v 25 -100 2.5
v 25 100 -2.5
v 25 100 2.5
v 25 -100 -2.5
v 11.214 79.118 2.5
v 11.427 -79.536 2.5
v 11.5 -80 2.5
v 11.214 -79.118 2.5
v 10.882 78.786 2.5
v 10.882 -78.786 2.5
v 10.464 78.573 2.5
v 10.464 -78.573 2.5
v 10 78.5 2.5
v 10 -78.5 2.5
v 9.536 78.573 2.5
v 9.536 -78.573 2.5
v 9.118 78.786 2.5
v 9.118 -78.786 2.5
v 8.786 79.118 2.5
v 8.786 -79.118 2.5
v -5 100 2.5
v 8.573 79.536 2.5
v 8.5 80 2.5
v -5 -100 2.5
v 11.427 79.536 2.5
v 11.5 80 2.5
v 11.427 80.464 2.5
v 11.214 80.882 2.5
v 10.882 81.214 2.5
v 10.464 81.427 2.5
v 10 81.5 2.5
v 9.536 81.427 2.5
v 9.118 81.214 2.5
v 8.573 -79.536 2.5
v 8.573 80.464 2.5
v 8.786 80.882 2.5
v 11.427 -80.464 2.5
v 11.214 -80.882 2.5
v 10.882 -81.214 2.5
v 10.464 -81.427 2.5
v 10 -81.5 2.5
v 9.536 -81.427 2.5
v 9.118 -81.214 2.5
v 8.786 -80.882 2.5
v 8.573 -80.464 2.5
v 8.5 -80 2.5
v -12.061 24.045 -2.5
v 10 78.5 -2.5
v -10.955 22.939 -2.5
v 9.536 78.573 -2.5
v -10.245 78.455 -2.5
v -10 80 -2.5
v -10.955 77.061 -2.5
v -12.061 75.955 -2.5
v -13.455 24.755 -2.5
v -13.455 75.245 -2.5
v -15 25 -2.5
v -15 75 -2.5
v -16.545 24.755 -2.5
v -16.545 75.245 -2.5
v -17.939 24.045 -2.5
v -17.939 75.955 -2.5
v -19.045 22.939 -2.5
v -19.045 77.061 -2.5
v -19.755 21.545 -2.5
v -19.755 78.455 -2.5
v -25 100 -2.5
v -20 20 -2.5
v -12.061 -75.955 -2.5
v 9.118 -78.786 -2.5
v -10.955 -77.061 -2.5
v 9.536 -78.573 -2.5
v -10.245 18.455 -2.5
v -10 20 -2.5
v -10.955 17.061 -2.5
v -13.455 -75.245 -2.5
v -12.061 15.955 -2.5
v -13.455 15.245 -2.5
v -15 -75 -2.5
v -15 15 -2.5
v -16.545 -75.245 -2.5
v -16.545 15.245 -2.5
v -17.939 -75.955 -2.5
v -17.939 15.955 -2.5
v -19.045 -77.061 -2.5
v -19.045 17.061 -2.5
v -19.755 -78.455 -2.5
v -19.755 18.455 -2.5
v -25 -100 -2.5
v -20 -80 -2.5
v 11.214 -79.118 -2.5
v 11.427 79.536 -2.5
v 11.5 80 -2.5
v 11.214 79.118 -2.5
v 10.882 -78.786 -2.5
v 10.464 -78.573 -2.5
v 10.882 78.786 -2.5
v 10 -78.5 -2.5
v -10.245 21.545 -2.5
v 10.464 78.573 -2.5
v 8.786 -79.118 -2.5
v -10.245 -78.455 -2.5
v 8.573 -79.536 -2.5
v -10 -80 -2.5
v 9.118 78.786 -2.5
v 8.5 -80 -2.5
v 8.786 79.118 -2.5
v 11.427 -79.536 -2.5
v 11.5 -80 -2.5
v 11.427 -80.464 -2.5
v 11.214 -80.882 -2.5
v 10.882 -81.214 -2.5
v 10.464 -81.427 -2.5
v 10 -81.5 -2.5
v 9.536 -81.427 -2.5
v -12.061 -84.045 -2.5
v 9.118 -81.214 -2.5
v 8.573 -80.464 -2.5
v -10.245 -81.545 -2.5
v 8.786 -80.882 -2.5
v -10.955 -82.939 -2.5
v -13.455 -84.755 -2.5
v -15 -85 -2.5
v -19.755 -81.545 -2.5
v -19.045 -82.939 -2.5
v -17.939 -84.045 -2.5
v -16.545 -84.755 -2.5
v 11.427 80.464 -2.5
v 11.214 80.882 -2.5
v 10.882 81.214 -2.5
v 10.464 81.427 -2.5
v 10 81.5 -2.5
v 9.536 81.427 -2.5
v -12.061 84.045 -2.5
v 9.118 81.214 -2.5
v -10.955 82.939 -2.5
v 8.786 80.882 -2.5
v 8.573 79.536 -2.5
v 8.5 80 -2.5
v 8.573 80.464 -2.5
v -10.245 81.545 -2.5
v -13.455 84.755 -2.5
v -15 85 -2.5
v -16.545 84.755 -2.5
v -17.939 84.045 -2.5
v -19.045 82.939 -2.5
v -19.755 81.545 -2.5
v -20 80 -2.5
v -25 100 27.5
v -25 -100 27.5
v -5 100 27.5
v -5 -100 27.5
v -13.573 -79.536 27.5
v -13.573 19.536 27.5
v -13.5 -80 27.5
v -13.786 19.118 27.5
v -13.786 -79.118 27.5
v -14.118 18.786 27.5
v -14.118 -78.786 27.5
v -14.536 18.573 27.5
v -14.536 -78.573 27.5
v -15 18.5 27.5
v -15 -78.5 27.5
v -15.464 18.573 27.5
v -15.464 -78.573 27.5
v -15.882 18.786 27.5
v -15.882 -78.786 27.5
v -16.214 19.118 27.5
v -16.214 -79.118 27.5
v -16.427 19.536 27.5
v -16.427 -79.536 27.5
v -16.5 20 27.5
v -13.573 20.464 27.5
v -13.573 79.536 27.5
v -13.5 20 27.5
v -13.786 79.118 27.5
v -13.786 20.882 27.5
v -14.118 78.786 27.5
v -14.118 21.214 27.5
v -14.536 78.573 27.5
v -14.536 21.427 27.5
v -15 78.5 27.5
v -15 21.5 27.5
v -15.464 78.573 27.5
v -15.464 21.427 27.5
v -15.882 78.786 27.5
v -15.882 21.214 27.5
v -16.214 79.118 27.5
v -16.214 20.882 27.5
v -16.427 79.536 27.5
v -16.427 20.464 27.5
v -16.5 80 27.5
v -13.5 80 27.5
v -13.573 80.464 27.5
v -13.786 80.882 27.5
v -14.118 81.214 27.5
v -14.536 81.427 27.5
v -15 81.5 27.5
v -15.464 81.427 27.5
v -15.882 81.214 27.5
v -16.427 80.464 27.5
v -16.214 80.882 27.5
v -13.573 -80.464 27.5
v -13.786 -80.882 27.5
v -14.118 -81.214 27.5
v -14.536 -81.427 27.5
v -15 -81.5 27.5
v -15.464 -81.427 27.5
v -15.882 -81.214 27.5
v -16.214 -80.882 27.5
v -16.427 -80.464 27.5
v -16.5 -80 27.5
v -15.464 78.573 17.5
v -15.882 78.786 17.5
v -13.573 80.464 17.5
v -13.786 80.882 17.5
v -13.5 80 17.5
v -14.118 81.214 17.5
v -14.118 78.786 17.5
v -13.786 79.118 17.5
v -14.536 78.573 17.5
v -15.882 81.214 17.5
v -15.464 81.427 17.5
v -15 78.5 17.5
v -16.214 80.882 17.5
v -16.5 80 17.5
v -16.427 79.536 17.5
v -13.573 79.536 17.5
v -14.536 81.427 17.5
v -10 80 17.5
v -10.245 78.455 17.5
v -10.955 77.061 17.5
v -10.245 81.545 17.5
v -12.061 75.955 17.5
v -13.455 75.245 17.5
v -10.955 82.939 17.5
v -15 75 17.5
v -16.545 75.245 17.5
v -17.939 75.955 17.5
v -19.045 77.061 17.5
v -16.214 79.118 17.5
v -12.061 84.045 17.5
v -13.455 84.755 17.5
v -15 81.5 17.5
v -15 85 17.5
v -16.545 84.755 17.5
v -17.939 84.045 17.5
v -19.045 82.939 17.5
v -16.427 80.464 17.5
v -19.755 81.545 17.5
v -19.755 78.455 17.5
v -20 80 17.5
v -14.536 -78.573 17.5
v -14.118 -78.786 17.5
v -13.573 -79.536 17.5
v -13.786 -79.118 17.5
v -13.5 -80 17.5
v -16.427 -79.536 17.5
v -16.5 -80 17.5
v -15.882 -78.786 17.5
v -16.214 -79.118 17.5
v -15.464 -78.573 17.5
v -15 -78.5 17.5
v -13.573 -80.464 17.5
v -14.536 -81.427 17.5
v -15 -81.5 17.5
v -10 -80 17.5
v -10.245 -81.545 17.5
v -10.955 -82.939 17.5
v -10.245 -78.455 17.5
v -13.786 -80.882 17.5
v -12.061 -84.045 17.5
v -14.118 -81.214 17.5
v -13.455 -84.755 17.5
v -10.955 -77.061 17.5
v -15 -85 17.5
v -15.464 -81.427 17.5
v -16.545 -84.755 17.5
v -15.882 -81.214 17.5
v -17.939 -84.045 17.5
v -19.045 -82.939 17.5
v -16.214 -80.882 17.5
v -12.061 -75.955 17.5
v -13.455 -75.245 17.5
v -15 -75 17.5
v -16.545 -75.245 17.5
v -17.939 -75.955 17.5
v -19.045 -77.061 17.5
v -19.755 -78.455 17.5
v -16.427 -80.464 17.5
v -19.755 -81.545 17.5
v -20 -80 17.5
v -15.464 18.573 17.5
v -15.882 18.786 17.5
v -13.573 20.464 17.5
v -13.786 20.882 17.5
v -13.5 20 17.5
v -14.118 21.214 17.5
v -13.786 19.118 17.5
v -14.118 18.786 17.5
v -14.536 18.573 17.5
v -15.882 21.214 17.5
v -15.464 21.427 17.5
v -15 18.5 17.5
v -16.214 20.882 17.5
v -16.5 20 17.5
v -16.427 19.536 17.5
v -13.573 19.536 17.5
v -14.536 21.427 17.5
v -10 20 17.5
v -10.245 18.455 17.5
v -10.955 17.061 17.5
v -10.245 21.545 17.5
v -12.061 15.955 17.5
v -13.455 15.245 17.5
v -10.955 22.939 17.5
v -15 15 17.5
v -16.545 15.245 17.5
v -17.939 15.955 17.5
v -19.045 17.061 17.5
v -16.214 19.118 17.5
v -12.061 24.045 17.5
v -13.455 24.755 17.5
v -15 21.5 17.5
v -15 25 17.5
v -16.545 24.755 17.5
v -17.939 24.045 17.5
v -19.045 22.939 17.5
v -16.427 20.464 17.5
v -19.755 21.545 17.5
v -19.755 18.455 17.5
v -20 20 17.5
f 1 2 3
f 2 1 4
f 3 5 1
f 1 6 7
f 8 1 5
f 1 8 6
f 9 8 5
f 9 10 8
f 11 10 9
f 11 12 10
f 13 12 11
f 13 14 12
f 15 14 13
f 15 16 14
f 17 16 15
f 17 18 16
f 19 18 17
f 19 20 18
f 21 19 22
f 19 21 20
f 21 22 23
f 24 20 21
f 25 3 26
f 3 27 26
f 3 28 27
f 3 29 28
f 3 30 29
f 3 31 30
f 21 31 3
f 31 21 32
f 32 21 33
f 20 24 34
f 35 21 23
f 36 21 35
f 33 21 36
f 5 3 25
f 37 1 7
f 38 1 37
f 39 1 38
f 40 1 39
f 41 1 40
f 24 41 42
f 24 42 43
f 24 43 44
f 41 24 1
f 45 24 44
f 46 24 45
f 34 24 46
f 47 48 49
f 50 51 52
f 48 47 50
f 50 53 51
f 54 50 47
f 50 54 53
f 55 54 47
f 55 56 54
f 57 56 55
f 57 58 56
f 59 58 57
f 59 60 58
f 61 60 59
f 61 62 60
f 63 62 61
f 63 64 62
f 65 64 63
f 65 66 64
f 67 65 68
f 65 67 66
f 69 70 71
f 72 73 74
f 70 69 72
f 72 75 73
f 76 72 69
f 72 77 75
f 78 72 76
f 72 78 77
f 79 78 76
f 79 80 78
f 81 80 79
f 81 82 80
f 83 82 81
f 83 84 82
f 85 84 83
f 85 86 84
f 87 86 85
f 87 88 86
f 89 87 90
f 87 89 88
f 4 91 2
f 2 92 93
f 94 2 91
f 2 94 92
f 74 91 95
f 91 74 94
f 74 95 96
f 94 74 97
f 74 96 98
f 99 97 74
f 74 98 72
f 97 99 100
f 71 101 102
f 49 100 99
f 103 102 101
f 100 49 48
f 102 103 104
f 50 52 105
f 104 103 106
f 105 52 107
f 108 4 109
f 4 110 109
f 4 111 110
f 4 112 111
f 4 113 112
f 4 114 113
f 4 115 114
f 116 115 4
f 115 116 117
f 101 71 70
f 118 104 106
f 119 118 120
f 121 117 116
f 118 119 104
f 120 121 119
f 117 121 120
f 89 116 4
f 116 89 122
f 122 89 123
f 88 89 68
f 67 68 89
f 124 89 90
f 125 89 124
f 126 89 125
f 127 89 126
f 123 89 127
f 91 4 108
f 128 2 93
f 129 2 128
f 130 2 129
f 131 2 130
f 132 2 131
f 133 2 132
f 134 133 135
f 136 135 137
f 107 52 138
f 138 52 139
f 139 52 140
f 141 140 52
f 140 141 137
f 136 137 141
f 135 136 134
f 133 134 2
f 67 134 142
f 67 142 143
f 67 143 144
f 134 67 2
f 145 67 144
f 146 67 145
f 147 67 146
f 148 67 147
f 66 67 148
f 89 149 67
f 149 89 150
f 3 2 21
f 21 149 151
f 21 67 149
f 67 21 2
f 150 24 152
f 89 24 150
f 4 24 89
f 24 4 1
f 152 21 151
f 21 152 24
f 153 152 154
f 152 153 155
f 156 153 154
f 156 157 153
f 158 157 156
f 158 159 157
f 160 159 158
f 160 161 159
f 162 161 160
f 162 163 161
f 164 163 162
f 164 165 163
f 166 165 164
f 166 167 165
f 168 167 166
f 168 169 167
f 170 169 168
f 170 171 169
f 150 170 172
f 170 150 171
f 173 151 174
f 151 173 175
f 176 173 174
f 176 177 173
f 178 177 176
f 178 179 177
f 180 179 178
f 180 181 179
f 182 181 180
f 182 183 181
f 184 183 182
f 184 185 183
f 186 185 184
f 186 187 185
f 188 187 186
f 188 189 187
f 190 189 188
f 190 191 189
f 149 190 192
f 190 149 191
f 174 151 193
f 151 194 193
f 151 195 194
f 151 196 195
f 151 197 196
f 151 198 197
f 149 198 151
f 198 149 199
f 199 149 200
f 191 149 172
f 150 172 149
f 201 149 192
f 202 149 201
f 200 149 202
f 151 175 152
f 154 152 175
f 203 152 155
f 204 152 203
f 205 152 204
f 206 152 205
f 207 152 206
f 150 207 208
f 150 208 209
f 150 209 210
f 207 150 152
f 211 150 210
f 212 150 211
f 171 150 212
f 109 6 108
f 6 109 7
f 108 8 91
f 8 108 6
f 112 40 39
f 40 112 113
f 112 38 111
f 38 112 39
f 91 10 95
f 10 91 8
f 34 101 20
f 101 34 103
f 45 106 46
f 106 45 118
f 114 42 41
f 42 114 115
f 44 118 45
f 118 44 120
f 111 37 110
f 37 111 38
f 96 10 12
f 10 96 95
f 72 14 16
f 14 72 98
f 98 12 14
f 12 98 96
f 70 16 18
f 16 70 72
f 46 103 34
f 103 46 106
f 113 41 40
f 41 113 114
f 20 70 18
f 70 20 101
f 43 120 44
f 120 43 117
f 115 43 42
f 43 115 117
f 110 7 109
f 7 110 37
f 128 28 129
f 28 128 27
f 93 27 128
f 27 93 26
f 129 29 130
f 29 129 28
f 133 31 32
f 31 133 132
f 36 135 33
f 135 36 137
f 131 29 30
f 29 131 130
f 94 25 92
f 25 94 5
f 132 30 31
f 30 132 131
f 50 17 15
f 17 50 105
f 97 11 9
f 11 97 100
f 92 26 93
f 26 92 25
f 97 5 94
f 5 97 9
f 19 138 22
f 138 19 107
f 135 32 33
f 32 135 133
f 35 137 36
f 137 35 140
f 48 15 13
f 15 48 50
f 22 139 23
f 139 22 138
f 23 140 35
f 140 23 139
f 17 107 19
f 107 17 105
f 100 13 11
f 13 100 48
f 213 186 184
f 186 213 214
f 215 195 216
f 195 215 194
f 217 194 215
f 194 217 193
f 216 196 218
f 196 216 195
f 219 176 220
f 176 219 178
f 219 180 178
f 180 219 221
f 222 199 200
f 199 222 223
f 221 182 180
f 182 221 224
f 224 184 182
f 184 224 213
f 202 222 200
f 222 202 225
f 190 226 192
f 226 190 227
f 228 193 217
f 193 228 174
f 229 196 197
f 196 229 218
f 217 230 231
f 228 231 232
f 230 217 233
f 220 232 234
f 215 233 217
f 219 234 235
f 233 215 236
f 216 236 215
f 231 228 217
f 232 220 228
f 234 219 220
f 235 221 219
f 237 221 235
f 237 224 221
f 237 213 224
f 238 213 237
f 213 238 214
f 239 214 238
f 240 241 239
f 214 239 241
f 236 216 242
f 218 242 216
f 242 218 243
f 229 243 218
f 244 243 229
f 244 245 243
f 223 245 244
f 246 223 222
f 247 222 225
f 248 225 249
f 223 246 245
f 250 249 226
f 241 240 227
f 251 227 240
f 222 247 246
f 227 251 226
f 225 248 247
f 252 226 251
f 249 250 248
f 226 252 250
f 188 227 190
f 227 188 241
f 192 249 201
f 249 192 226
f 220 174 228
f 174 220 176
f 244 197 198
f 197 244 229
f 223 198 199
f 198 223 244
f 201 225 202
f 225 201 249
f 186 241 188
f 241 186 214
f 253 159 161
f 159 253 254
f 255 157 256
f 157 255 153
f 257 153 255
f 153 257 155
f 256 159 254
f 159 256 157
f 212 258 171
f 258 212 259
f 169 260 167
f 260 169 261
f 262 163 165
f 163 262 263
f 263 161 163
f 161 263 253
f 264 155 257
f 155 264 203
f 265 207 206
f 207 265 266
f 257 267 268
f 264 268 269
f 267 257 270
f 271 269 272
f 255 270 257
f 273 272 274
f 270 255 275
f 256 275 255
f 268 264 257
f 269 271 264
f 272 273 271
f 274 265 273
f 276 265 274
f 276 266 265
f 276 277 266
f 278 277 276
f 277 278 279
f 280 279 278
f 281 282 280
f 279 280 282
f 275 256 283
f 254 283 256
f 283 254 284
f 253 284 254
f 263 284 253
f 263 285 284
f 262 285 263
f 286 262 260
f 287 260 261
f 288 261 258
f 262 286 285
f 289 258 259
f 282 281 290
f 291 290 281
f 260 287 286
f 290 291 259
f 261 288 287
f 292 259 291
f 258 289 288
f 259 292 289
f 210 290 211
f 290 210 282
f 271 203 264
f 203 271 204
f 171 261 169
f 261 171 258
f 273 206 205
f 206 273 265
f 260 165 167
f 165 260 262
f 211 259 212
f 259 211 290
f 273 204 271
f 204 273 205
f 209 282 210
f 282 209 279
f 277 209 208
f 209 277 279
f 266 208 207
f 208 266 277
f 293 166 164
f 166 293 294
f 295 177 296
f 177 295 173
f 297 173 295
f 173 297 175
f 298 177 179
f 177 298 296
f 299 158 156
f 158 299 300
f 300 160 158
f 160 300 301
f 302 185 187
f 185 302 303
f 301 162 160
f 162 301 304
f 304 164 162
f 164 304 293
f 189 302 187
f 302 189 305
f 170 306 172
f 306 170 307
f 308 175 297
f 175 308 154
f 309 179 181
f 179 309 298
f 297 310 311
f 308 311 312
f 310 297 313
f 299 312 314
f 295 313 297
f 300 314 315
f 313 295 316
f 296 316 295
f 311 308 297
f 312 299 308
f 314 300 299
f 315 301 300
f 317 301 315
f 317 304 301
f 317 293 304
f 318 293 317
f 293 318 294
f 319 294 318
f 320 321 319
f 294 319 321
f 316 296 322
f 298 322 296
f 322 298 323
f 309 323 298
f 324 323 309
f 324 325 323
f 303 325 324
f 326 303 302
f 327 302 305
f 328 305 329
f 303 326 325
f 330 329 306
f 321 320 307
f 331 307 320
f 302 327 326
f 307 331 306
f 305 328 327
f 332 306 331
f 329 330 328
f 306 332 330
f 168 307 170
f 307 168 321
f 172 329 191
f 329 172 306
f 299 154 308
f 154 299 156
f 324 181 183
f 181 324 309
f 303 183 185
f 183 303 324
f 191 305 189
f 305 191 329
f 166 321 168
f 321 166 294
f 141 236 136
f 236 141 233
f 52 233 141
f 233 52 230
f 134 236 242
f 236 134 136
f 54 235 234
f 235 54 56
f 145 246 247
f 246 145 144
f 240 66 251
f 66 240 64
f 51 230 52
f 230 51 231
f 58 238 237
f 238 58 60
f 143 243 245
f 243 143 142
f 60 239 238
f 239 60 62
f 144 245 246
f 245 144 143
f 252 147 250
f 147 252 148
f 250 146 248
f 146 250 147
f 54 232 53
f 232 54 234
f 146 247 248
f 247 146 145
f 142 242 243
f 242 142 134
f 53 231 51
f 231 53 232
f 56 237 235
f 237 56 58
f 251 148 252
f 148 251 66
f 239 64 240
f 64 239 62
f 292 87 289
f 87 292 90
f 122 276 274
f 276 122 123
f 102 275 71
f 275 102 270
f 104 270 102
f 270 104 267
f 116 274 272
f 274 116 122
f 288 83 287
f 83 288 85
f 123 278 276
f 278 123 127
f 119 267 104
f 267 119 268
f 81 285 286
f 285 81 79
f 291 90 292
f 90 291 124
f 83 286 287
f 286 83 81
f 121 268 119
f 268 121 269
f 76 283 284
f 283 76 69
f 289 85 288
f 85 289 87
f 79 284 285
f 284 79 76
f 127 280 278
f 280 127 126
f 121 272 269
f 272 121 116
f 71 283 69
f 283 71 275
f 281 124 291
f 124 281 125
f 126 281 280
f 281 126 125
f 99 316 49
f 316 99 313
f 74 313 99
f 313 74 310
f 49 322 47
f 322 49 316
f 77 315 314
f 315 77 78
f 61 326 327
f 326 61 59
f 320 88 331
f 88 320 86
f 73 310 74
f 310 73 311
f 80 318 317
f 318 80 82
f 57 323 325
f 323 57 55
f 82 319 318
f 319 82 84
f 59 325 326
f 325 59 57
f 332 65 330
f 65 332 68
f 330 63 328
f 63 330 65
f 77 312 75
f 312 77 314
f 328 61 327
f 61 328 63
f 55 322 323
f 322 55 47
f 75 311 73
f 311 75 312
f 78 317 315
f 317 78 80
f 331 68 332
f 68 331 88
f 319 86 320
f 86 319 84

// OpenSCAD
//Author: Piotr Paterek, Kraków 05-08.2016
$fn=20;
module bevel(){
cube([50, 200, 5], center=true);
translate([-15, 0, 15])
{
    cube([20, 200, 25], center=true);
    
}
}
module bevelholes()
{
difference()
{
    difference()
    {
        difference()
            {
            difference()
                {
                difference(){
                    difference()
                    {  
                        bevel();
                        translate([10, -80, -2.5])
                        {
                            cylinder(r=1.5, h=5);
                        }
                    }
                    translate([10, 80, -2.5])
                        {
                        cylinder(r=1.5, h=5);
                        }
                    }
                translate([-15, 80, 17.5])
                    {
                    cylinder(r=1.5, h=10);
                    }
                 }
            translate([-15, -80, 17.5])
                {
                cylinder(r=1.5, h=10);
                }
            }
            translate([-15, 20, 17.5])
                {
                cylinder(r=1.5, h=10);
                }
            }
        }
    }
    
 
difference()
{ 
     difference()
        {   
            difference()
            {
                bevelholes();
                translate([-15,80,-2.5])
                {
                    cylinder(r=5, h=20);
                }
            }
            translate([-15,-80,-2.5])
                {
                    cylinder(r=5, h=20);
                }
            }
            
         translate([-15,20,-2.5])
                {
                    cylinder(r=5, h=20);
                }
            }
